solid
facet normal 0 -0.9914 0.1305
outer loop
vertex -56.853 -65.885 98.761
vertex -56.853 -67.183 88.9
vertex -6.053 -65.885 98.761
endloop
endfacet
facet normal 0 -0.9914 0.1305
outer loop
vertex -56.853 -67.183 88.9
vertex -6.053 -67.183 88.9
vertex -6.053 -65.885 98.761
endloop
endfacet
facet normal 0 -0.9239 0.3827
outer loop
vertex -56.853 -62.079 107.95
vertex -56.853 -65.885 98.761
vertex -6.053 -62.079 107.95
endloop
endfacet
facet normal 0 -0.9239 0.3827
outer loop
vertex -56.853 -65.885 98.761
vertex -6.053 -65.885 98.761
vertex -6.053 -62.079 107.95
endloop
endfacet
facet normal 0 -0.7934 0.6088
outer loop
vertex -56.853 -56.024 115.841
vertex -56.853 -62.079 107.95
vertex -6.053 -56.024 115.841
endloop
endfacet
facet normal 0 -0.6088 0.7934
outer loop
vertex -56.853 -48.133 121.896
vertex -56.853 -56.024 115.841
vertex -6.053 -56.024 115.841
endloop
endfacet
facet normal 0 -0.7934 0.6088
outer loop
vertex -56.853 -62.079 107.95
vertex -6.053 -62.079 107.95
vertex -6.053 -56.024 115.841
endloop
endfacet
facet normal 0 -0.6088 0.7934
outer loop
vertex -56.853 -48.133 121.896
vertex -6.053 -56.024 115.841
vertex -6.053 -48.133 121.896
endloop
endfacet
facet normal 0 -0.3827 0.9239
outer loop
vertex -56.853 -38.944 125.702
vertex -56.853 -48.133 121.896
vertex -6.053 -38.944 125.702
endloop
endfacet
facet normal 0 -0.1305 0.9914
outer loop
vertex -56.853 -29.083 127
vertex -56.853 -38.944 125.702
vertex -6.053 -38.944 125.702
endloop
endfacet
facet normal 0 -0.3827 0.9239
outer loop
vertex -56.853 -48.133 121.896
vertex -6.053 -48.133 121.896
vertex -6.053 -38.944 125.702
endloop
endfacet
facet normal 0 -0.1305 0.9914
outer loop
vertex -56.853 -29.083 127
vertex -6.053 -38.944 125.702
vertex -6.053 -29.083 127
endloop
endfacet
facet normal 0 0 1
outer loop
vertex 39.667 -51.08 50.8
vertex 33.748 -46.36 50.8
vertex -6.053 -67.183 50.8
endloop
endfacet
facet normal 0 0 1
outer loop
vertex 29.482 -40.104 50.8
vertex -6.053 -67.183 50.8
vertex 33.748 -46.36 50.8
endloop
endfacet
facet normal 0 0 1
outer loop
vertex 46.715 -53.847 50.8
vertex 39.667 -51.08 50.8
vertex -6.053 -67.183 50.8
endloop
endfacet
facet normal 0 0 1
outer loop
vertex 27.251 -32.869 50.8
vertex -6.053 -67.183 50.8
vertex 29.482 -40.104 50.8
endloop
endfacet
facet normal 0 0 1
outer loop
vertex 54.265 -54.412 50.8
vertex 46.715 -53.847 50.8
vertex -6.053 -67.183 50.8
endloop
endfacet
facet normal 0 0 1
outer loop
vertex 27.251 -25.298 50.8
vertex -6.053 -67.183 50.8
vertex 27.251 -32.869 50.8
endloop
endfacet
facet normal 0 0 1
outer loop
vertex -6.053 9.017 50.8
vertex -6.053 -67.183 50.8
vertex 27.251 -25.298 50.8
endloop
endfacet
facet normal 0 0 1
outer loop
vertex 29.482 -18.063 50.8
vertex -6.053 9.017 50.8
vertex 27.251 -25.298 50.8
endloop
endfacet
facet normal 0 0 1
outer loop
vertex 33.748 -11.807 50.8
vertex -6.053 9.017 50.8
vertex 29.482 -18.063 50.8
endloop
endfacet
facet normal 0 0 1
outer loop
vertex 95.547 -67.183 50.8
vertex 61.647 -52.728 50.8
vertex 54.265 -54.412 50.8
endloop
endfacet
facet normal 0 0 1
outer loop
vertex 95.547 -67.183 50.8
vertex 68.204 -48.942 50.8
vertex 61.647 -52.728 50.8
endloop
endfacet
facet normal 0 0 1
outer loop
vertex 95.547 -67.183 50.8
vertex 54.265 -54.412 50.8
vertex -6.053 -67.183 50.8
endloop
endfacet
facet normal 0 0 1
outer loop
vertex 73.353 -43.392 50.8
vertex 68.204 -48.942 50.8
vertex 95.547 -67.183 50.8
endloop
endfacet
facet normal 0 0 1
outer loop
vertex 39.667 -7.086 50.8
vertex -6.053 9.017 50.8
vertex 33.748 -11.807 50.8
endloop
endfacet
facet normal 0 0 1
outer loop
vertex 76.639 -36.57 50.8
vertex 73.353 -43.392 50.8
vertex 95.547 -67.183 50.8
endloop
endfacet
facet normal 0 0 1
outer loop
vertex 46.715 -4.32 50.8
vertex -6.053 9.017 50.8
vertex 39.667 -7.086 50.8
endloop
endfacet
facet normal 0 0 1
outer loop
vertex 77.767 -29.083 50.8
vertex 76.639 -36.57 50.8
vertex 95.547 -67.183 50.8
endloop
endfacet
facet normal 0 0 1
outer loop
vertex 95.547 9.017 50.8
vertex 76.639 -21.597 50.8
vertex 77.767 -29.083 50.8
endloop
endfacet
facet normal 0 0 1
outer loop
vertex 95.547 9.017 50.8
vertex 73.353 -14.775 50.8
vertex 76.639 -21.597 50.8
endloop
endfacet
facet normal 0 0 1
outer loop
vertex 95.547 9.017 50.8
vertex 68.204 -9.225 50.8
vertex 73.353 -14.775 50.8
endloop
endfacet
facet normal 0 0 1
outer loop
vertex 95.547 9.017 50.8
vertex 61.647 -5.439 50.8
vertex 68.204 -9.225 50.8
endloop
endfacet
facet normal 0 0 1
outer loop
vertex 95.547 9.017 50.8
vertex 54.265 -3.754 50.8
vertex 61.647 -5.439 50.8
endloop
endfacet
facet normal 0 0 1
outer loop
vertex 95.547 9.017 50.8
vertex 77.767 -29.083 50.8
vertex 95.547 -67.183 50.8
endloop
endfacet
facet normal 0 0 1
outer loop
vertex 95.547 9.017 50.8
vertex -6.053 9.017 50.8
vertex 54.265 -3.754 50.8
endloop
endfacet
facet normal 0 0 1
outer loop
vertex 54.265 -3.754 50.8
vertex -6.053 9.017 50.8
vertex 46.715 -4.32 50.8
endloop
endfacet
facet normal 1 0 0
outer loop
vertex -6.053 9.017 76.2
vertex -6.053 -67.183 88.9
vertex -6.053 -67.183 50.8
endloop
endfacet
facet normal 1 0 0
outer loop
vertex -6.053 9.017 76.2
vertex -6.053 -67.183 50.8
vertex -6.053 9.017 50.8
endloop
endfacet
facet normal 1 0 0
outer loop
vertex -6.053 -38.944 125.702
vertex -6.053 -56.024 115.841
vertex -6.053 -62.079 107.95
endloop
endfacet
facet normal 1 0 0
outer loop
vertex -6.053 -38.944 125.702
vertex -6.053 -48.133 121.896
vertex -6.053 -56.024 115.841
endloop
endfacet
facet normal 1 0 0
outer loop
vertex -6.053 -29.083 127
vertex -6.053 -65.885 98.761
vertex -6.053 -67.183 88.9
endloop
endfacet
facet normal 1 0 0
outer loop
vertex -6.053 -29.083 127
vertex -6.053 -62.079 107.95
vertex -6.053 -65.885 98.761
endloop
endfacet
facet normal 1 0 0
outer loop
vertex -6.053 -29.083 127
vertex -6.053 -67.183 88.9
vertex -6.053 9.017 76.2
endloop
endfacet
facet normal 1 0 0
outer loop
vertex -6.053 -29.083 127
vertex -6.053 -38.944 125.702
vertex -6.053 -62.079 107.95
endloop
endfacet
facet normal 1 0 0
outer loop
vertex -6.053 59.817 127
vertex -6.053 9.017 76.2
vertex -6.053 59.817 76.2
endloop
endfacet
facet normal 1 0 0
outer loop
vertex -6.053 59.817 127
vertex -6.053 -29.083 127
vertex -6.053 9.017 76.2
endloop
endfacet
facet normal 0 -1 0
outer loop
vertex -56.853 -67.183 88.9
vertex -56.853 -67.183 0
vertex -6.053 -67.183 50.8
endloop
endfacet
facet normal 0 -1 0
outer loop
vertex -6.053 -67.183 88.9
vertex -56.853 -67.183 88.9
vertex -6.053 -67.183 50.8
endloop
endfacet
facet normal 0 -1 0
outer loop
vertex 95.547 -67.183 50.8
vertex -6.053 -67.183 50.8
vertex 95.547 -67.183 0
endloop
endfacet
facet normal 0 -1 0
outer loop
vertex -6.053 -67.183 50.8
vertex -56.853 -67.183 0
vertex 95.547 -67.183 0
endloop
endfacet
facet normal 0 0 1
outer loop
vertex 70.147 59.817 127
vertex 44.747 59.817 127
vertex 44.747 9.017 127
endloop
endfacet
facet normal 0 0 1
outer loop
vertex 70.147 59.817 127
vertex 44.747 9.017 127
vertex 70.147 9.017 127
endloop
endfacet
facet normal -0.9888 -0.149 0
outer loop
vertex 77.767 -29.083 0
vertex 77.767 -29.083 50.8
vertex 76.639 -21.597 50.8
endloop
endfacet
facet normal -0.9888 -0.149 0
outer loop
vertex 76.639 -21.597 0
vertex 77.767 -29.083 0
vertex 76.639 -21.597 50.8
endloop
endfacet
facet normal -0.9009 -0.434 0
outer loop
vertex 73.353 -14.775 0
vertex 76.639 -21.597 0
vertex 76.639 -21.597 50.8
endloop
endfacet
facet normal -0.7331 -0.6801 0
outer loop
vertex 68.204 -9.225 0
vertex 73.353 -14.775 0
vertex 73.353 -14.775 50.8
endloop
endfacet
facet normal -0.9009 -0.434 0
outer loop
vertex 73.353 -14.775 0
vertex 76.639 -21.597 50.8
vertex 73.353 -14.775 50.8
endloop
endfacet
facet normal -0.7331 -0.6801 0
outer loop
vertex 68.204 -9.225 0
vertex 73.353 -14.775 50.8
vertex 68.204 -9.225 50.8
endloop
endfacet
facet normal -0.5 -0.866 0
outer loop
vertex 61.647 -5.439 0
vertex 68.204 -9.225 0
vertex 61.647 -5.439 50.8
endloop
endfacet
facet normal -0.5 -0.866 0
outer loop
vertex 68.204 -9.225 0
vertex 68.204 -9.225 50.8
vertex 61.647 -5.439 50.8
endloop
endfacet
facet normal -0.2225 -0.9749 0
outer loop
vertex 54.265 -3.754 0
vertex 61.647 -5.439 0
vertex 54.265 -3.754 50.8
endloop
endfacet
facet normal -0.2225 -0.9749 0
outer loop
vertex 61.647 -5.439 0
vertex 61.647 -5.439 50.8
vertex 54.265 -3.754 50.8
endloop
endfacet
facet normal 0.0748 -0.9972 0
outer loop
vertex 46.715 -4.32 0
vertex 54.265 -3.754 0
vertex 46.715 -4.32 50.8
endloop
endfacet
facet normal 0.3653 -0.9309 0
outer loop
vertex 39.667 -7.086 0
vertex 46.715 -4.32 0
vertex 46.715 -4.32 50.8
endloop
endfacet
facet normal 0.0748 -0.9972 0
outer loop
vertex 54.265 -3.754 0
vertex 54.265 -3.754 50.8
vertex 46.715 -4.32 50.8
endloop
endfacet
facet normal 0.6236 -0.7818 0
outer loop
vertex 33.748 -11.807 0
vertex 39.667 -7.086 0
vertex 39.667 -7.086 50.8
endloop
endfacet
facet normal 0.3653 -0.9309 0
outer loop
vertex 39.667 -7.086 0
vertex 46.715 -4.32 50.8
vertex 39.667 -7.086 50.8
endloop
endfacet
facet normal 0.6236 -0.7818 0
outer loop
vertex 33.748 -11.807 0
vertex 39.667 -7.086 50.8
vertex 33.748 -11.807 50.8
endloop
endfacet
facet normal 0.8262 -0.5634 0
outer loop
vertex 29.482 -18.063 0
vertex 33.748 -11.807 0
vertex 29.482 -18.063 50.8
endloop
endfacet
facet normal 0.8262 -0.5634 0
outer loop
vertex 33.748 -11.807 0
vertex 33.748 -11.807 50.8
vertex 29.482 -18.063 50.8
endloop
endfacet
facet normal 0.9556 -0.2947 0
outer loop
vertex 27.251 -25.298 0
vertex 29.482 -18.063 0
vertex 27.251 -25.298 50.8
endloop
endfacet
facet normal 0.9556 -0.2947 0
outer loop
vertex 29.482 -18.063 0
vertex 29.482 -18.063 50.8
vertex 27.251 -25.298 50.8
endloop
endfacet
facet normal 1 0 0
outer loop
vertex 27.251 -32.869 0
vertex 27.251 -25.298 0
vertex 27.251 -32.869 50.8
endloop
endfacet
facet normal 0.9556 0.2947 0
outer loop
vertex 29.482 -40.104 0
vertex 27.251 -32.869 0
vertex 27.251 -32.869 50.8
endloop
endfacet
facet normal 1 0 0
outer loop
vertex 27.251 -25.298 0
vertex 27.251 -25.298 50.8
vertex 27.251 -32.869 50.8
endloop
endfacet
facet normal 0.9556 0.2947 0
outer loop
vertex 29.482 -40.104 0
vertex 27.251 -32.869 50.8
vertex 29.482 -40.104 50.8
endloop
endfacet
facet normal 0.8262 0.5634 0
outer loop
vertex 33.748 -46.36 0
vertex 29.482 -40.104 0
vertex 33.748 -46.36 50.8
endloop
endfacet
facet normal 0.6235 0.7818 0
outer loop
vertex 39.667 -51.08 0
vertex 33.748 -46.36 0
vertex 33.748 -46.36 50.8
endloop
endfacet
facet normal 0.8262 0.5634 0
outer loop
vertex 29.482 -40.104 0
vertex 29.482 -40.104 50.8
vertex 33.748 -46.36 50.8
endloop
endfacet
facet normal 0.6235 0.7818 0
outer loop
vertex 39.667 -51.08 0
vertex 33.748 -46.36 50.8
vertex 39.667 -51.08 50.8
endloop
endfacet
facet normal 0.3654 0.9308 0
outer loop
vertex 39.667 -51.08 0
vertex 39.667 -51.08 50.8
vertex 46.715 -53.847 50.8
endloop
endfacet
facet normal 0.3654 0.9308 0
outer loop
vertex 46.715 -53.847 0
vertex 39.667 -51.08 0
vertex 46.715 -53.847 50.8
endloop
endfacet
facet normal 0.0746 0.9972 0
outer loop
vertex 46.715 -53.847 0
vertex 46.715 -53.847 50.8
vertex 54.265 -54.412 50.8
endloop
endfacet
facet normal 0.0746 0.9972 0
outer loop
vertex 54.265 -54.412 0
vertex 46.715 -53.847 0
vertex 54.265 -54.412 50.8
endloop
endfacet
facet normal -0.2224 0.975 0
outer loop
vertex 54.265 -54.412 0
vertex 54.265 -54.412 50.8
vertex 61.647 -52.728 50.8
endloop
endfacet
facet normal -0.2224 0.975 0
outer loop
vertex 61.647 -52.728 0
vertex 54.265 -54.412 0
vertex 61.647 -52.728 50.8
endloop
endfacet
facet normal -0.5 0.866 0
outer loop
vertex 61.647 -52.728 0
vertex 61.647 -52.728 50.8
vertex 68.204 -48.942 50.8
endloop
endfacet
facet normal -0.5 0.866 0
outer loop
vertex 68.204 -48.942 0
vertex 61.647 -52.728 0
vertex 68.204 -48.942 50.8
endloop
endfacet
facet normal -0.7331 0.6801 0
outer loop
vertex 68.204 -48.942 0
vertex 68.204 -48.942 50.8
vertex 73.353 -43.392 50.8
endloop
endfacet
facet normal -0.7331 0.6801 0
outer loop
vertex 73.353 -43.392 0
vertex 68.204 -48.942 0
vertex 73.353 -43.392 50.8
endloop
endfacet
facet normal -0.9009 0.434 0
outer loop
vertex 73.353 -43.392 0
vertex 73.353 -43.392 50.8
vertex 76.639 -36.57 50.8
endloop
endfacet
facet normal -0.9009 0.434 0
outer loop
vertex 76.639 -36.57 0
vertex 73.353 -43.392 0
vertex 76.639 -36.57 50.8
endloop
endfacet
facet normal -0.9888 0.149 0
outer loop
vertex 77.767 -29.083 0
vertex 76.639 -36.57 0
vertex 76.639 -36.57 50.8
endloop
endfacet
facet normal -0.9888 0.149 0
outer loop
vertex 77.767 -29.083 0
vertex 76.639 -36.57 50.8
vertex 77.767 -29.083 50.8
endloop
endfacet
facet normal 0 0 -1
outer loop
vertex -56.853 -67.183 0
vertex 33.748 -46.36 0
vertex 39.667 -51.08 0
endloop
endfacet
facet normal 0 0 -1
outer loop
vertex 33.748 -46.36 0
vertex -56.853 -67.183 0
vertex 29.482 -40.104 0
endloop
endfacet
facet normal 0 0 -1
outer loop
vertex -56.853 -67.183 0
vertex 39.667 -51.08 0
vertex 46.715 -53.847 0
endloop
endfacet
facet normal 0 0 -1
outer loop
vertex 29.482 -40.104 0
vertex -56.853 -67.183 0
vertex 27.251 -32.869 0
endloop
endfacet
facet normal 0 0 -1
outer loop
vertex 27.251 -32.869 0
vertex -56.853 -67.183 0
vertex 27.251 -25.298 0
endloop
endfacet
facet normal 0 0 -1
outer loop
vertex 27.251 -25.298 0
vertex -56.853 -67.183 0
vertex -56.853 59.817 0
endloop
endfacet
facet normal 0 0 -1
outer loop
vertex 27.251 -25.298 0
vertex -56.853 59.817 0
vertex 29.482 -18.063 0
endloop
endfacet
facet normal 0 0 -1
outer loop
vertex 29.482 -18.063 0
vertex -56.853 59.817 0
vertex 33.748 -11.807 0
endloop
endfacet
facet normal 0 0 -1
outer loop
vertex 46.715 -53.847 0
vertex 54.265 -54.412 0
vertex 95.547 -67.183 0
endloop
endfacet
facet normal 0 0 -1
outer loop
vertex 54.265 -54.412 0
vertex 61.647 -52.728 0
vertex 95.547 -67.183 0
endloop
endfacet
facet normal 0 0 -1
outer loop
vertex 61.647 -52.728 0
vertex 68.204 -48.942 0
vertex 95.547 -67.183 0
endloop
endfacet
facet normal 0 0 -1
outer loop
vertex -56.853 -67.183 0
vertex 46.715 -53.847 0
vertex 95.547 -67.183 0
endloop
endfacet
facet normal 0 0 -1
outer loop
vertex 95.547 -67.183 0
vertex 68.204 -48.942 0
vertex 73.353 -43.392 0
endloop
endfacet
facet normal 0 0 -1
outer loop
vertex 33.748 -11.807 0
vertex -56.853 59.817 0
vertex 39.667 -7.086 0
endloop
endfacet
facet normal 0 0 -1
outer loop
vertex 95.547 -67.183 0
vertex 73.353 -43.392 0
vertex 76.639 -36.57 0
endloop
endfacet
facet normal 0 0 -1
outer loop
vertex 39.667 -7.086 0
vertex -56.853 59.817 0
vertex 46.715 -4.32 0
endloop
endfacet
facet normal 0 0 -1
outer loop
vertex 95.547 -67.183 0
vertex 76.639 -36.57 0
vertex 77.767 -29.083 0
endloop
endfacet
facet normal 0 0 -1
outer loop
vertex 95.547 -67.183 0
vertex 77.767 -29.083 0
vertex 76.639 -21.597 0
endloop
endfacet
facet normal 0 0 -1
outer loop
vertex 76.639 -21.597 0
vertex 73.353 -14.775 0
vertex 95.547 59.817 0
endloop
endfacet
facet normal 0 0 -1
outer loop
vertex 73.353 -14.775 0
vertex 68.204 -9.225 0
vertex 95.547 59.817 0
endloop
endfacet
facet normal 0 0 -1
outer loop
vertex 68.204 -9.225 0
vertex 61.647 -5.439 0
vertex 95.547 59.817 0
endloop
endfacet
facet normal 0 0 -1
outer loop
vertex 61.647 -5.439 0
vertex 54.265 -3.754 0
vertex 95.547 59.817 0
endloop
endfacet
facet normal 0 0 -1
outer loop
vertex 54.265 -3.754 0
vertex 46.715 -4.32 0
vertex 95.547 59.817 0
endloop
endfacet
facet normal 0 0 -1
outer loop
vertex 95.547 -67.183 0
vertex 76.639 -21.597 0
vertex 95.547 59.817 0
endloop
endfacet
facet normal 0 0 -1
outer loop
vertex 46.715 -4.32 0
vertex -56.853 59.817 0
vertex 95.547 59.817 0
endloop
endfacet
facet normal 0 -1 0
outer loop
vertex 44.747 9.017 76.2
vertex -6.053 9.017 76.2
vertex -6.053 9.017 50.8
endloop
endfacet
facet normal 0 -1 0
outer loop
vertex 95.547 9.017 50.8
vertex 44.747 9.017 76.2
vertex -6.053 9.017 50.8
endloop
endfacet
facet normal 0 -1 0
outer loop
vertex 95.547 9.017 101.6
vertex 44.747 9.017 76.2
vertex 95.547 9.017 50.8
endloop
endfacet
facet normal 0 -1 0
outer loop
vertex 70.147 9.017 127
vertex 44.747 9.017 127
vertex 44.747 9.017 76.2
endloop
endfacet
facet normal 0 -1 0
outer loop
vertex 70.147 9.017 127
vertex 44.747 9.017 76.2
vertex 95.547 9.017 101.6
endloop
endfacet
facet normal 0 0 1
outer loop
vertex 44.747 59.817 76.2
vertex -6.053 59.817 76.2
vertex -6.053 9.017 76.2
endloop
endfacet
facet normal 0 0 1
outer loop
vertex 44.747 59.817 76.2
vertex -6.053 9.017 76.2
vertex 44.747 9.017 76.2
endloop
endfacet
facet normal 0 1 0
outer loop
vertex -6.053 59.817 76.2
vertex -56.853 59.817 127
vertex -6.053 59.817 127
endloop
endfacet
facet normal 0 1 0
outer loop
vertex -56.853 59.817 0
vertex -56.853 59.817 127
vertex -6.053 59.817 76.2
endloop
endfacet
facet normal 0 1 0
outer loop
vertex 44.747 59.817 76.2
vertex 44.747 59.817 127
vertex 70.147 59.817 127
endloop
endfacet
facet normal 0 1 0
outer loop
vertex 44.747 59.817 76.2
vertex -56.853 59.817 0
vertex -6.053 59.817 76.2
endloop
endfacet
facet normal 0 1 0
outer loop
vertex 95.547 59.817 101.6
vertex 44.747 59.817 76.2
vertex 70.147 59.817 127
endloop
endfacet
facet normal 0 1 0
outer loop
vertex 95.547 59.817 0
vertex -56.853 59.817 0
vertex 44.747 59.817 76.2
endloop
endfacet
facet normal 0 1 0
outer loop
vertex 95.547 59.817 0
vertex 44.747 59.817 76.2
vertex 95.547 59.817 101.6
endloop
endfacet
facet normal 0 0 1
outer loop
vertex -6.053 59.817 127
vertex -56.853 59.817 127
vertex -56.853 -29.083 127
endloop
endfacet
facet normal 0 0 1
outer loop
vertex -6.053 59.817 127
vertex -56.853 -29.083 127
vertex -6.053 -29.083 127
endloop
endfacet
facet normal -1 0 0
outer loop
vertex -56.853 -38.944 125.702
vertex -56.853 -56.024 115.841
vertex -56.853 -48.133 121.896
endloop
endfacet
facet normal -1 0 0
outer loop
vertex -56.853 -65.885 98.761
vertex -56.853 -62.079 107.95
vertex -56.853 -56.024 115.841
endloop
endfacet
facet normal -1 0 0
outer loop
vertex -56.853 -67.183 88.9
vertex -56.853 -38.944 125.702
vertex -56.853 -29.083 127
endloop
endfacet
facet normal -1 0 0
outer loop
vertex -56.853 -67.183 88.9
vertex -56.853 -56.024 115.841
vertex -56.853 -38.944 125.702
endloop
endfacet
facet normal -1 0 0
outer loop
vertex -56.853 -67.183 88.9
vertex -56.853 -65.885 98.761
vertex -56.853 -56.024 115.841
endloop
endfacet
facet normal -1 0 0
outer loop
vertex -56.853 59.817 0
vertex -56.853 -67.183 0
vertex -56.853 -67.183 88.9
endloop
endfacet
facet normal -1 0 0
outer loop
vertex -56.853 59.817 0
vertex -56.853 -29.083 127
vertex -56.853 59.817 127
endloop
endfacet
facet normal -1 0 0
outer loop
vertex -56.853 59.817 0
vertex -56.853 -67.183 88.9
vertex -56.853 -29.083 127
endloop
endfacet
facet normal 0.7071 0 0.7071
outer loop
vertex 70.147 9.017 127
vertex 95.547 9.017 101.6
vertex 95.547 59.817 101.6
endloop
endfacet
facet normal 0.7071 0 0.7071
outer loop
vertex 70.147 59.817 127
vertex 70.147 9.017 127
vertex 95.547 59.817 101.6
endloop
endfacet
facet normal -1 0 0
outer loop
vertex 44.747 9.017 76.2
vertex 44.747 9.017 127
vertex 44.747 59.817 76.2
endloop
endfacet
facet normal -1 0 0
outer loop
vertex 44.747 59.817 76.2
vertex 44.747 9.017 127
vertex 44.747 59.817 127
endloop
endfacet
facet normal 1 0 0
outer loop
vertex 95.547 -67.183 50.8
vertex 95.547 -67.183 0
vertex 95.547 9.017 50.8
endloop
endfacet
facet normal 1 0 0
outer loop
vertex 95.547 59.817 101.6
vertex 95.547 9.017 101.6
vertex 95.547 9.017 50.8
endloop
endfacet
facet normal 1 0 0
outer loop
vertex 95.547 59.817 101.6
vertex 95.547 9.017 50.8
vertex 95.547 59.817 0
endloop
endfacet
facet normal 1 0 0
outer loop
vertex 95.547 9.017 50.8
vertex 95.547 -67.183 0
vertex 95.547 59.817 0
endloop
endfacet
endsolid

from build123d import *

# Parameters (mm, degrees)
F0_W     = 152.4
F0_H     = 127
F1_DEPTH = 127
F2_W     = 101.6
F2_H     = 76.2
F3_DEPTH = 76.2
F4_R     = 38.1
F5_SIZE  = 25.4
F6_W     = 50.8
F6_H     = 50.8
F7_DEPTH = 50.8
F8_R     = 25.4
F9_DEPTH = 50.801


with BuildPart() as f1:
    # F0 (on Top) → F1 (new body)
    with BuildSketch(Plane.XY):
        with Locations((19.347022, -3.683421)):
            Rectangle(F0_W, F0_H)
    extrude(amount=F1_DEPTH)

    # F2 (on face) → F3 (cut)
    with BuildSketch(Plane.XY.offset(127)):
        with Locations((44.747022, -29.083421)):
            Rectangle(F2_W, F2_H)
    extrude(amount=-F3_DEPTH, mode=Mode.SUBTRACT)

    # F4
    f4_edges = [f1.edges().sort_by_distance(p)[0] for p in [
        (-31.452978, -67.183421, 127),
    ]]
    fillet(f4_edges, radius=F4_R)

    # F5
    f5_edges = [f1.edges().sort_by_distance(p)[0] for p in [
        (95.547022, 34.416579, 127),
    ]]
    chamfer(f5_edges, length=F5_SIZE)

    # F6 (on face) → F7 (cut)
    with BuildSketch(Plane.XY.offset(127)):
        with Locations((19.347022, 34.416579)):
            Rectangle(F6_W, F6_H)
    extrude(amount=-F7_DEPTH, mode=Mode.SUBTRACT)

    # F8 (on face) → F9 (cut, through all)
    with BuildSketch(Plane.XY.offset(50.8)):
        with Locations((52.367022, -29.083421)):
            Circle(F8_R)
    extrude(amount=-F9_DEPTH, mode=Mode.SUBTRACT)


solid = f1.part
